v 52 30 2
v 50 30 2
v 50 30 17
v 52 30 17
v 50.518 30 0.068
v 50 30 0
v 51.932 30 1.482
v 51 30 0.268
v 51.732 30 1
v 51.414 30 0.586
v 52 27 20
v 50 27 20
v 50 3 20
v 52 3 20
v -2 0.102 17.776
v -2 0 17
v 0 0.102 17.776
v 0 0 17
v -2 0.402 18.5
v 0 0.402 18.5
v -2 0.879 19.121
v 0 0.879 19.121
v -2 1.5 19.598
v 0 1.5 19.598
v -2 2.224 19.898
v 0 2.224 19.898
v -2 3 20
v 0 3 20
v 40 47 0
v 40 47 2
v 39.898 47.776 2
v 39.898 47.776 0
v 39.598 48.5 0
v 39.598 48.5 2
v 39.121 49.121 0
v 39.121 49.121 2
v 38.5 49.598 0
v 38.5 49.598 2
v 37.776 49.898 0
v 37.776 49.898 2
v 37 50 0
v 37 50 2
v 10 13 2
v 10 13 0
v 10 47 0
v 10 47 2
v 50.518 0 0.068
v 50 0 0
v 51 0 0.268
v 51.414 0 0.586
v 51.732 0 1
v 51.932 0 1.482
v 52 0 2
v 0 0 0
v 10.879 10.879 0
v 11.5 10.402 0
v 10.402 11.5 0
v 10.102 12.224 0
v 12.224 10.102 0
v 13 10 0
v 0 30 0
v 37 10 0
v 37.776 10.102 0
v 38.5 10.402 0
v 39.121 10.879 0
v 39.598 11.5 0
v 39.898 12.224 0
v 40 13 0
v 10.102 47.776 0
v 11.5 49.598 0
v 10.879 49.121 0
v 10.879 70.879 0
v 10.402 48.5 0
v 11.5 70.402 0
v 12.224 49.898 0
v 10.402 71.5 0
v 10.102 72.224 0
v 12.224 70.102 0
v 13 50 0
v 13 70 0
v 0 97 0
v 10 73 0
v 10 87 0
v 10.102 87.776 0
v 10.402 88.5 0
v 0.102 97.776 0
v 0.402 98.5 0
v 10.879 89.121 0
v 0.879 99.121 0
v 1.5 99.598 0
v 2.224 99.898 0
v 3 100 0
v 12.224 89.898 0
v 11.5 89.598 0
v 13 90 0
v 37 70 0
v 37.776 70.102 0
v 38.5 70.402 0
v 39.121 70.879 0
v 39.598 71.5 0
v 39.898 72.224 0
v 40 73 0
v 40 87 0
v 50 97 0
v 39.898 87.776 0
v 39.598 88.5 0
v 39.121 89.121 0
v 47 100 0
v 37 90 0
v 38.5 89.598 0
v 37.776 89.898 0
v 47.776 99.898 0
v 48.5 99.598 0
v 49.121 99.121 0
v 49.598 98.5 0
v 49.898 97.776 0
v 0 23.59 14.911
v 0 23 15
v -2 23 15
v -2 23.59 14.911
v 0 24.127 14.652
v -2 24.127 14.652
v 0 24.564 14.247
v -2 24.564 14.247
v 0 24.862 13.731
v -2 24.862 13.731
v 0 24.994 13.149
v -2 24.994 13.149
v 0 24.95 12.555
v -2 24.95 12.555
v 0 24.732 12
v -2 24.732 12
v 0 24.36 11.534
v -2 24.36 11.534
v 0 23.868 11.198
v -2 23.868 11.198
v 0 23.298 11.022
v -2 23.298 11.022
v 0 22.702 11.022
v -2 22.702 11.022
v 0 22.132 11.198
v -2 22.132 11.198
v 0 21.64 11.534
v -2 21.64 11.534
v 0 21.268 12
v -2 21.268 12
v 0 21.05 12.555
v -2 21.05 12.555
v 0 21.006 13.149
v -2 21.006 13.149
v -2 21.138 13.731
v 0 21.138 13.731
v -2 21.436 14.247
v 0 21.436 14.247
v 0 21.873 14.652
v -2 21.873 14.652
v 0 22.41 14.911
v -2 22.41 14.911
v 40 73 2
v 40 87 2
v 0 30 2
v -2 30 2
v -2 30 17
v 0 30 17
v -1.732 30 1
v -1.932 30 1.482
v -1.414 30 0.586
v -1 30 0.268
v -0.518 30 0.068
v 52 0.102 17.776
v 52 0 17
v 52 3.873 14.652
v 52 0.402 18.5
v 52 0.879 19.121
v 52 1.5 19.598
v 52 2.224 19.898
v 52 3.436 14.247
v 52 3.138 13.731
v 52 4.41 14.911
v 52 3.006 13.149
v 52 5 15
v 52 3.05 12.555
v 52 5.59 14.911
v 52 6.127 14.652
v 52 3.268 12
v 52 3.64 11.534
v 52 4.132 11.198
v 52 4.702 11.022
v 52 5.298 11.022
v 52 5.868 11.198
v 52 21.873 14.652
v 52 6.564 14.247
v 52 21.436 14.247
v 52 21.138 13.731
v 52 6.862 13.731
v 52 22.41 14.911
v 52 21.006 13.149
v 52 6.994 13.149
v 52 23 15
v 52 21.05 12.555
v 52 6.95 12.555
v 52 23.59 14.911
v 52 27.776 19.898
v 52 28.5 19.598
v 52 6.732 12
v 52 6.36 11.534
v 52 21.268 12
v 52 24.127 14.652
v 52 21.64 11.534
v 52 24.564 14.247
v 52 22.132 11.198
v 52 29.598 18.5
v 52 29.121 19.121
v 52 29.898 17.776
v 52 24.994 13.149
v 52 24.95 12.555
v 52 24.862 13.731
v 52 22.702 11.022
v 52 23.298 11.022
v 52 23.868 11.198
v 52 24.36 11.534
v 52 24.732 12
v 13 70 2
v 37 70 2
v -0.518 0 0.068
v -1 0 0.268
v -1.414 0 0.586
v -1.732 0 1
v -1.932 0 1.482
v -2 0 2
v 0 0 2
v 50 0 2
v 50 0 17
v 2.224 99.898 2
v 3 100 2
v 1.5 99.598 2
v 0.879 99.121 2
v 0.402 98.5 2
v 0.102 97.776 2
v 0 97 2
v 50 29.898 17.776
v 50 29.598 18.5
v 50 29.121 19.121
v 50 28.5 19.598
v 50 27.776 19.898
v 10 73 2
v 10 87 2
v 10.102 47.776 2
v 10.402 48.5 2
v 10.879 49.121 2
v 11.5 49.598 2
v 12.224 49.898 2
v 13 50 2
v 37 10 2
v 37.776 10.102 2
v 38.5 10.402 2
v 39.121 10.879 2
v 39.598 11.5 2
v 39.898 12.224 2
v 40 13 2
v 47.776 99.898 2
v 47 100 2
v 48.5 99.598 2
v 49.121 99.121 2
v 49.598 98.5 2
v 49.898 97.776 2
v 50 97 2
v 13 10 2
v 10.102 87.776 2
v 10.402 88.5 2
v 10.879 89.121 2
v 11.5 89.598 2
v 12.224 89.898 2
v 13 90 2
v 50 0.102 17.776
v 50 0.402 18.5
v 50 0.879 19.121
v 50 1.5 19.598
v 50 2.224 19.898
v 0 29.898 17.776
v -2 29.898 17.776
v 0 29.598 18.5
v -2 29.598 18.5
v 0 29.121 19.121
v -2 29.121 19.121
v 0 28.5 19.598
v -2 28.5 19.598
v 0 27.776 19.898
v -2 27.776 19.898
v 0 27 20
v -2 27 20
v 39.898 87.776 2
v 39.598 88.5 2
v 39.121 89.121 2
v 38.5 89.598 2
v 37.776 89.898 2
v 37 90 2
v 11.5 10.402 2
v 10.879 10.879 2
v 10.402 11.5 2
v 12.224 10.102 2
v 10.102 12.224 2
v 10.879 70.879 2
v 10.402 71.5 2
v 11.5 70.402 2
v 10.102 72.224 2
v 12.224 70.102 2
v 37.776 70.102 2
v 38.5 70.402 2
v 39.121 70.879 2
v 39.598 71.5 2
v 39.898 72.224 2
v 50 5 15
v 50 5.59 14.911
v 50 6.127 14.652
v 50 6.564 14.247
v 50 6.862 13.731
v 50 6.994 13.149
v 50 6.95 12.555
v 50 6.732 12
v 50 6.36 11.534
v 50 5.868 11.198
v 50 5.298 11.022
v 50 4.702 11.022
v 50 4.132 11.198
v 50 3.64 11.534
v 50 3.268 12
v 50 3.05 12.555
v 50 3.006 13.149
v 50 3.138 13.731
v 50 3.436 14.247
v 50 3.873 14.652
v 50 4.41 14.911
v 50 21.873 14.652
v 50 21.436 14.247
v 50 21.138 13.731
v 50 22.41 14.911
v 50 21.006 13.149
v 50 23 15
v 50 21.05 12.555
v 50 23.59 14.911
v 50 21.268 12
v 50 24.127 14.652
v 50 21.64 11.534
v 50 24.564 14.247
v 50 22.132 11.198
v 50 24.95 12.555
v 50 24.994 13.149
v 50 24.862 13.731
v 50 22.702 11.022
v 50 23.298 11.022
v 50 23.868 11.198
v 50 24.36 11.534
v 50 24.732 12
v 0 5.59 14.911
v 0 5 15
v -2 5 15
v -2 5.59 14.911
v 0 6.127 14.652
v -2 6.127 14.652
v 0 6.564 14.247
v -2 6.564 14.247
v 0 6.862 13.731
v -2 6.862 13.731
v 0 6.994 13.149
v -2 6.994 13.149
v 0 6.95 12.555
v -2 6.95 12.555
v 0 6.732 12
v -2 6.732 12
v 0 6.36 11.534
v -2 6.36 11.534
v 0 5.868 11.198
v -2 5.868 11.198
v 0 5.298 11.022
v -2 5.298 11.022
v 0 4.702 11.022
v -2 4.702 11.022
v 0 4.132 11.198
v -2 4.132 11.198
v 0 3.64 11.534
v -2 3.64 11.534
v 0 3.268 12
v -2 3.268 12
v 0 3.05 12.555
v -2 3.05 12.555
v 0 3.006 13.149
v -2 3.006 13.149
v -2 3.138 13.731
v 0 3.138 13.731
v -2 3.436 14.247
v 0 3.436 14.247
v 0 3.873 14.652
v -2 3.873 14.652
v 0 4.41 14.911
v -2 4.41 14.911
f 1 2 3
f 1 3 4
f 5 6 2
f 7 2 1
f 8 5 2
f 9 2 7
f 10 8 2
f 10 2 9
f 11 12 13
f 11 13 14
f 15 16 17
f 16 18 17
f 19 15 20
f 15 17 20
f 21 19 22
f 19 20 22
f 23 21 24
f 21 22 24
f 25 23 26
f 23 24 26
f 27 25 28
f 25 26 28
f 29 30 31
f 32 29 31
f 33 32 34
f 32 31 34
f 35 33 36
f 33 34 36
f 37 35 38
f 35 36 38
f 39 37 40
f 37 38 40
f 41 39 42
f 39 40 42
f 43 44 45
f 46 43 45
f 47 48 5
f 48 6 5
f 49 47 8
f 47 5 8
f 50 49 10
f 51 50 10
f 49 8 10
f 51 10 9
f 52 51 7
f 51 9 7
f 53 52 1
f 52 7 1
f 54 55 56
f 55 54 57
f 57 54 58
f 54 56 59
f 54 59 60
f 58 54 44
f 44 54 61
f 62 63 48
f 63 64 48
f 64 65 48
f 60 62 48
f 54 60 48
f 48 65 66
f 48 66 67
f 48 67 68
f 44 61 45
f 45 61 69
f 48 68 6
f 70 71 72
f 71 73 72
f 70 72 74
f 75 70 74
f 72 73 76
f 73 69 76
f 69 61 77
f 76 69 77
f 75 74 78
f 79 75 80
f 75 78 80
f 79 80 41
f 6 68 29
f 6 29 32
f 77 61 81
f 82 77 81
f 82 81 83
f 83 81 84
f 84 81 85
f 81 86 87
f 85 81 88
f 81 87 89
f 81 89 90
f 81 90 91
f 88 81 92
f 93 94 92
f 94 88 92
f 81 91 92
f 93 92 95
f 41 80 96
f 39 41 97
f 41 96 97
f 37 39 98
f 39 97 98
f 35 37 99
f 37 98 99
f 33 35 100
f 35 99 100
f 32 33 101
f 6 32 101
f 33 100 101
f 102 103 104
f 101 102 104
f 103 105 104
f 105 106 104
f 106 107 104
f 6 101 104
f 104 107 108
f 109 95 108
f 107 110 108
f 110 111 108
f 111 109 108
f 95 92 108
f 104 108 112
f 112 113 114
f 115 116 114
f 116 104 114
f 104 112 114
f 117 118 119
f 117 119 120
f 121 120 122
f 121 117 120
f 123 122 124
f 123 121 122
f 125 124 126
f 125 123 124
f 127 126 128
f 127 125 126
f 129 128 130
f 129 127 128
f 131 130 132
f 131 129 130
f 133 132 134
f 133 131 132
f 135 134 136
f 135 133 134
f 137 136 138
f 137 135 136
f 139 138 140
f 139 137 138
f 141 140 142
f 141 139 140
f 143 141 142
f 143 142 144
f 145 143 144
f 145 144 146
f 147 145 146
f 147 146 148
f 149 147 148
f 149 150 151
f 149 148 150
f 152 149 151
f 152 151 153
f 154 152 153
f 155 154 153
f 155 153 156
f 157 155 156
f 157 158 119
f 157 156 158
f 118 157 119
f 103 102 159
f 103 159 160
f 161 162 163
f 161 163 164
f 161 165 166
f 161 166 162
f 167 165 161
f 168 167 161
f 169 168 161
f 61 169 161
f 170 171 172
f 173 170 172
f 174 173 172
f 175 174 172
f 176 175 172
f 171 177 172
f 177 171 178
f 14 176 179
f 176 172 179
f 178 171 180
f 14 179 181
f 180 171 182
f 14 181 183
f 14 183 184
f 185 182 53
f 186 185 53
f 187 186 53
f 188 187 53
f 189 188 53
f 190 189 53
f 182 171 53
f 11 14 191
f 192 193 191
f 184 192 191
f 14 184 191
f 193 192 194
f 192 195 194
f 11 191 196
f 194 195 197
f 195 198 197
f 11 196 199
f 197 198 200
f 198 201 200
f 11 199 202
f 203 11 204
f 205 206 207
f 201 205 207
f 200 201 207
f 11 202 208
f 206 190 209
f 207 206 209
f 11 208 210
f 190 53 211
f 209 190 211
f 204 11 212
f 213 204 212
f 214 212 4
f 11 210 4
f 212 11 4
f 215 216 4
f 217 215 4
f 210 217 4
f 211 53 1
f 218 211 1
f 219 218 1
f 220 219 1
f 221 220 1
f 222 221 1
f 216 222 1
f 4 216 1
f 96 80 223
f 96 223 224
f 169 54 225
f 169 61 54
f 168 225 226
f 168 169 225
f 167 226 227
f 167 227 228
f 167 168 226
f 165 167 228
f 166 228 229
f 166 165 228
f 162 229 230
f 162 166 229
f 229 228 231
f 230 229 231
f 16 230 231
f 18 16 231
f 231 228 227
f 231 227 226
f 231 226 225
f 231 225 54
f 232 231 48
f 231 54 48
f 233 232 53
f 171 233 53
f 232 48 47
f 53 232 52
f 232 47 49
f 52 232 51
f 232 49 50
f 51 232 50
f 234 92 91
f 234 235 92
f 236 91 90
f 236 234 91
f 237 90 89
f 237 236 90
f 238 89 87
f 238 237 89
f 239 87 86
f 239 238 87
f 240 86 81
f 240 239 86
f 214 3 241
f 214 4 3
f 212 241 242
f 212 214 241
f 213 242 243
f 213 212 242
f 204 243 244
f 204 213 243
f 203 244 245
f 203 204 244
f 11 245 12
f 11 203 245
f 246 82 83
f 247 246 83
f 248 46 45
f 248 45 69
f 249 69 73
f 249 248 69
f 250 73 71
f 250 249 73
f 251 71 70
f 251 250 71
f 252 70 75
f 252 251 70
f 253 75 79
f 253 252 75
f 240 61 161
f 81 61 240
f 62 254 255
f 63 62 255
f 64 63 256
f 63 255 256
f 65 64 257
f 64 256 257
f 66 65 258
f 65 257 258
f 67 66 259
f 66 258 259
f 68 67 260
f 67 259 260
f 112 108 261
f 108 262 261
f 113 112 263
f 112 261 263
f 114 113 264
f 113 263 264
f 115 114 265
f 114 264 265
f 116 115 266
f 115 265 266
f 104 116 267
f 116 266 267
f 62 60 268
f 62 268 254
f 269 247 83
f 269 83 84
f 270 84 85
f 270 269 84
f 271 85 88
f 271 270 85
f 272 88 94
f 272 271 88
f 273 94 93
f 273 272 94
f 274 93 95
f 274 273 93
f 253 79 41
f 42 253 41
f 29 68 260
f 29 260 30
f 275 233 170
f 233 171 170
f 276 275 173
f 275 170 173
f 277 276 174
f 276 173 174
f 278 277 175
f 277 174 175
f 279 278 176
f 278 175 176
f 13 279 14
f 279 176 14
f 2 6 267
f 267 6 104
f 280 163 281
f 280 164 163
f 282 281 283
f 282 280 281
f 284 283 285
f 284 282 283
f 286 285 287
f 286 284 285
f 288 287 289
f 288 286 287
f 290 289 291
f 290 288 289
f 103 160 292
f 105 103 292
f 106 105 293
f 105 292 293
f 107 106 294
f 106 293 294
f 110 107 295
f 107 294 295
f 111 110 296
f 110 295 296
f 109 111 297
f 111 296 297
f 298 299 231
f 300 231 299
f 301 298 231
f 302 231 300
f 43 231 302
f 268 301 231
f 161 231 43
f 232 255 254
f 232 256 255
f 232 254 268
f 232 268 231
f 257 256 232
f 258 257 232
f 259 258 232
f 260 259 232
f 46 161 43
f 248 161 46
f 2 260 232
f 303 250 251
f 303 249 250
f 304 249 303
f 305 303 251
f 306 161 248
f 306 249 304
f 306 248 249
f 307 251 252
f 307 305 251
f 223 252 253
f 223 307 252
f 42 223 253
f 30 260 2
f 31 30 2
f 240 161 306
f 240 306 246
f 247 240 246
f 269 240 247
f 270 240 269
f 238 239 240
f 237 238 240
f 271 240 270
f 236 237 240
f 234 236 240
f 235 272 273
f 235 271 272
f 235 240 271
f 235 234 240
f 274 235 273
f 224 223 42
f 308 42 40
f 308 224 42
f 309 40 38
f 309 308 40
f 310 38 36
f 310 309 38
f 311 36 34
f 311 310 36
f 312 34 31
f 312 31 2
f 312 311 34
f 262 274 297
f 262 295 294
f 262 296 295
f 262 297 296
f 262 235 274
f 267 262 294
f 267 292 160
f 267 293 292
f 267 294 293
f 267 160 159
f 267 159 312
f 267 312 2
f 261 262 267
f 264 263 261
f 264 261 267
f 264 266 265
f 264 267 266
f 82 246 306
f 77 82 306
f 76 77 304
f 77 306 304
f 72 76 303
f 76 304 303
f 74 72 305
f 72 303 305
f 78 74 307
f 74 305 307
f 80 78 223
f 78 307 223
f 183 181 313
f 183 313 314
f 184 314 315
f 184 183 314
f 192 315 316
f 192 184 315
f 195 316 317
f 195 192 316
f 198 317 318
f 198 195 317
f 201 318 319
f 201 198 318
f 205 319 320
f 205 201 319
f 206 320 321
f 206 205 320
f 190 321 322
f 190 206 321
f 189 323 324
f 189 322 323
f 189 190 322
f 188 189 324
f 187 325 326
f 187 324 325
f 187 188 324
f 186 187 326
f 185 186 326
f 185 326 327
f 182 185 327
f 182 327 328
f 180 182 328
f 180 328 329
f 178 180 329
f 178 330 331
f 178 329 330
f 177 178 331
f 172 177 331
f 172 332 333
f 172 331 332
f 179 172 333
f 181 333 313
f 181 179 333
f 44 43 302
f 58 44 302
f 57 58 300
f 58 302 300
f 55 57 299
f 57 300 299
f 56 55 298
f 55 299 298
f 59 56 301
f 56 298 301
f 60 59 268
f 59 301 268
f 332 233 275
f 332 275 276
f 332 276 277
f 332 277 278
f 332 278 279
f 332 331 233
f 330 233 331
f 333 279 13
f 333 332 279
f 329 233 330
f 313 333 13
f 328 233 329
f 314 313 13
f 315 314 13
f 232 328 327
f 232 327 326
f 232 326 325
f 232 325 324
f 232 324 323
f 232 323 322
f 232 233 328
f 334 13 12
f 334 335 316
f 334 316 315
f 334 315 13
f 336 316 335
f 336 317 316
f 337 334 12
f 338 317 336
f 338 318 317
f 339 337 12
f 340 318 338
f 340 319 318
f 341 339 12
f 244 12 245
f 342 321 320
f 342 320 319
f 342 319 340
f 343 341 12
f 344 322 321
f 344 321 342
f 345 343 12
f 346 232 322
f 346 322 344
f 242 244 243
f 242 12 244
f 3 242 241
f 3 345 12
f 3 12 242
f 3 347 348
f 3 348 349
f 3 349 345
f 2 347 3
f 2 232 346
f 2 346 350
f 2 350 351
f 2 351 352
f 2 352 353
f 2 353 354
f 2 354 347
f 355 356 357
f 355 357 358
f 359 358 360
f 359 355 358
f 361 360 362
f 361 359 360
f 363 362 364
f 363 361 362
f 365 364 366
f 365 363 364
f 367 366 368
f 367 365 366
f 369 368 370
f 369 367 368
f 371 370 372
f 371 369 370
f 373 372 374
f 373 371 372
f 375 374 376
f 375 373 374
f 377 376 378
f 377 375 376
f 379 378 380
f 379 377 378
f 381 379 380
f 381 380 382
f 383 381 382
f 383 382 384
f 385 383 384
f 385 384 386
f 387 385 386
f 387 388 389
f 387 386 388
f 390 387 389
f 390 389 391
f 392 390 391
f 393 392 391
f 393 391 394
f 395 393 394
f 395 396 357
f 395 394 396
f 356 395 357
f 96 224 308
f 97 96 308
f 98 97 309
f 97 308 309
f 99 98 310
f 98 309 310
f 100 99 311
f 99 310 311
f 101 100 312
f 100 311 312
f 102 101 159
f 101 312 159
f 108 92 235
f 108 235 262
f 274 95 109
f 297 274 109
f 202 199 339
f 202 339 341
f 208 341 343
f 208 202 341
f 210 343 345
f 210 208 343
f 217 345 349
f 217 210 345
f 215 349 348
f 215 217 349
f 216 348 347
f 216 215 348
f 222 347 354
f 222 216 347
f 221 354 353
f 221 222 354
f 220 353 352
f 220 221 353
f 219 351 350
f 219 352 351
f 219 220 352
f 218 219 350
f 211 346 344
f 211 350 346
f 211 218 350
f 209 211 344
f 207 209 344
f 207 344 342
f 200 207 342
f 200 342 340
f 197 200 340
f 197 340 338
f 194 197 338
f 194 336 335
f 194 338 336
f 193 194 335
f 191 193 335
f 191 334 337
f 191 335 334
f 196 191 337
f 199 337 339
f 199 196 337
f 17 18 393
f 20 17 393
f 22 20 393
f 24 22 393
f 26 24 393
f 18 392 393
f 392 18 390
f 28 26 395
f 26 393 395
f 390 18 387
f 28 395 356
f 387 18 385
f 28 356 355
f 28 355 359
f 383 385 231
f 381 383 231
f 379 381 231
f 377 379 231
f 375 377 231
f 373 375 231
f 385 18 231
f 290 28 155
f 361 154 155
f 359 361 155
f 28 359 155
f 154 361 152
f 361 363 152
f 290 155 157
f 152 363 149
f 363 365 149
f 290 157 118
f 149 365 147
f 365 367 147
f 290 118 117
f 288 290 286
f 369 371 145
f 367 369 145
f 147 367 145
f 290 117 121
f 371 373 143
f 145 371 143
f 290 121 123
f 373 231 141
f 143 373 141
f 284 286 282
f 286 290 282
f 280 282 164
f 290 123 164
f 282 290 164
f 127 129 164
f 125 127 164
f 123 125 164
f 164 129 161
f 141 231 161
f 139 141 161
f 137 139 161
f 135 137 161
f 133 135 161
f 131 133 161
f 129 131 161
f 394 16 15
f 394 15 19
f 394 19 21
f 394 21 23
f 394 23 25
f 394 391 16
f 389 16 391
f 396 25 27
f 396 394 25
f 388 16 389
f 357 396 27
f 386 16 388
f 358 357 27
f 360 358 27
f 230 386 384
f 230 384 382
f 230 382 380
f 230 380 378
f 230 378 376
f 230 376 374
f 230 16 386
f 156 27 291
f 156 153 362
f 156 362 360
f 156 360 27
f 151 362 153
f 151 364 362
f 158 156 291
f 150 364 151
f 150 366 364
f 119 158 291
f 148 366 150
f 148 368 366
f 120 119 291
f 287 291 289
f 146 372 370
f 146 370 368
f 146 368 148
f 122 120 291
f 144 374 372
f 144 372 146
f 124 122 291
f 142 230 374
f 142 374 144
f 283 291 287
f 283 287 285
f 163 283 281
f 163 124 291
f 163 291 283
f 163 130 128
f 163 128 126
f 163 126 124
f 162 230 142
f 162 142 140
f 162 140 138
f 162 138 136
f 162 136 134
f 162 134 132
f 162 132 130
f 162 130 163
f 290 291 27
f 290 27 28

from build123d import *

# Parameters (mm, degrees)
CYLINDER001_R     = 2
CYLINDER001_DEPTH = 10
CYLINDER_R        = 2
CYLINDER_DEPTH    = 10
BOX003_W          = 2
BOX003_H          = 30
BOX003_DEPTH      = 20
FILLET004_R       = 3
CYLINDER003_R     = 2
CYLINDER003_DEPTH = 10
CYLINDER002_R     = 2
CYLINDER002_DEPTH = 10
BOX004_W          = 2
BOX004_H          = 30
BOX004_DEPTH      = 20
FILLET005_R       = 3
BOX002_W          = 30
BOX002_H          = 40
BOX002_DEPTH      = 10
FILLET001_R       = 3
BOX001_W          = 30
BOX001_H          = 20
BOX001_DEPTH      = 10
FILLET_R          = 3
BOX_W             = 50
BOX_H             = 100
BOX_DEPTH         = 2
FILLET002_R       = 3
FILLET003_R       = 3
FILLET006_R       = 2
FILLET007_R       = 2


with BuildPart() as cilindre001:
    # Cylinder001 → Cylinder001 (new body)
    with BuildSketch(Plane(origin=(-10, 23, 13), x_dir=(0, 0, 1), z_dir=(-1, 0, 0))):
        Circle(CYLINDER001_R)
    extrude(amount=CYLINDER001_DEPTH)


with BuildPart() as cilindre:
    # Cylinder → Cylinder (new body)
    with BuildSketch(Plane(origin=(-10, 5, 13), x_dir=(0, 0, 1), z_dir=(-1, 0, 0))):
        Circle(CYLINDER_R)
    extrude(amount=CYLINDER_DEPTH)


with BuildPart() as cut003:
    # Box003 → Box003 (new body)
    with BuildSketch(Plane(origin=(-14, 0, 0), x_dir=(1, 0, 0), z_dir=(0, 0, 1))):
        with Locations((1, 15)):
            Rectangle(BOX003_W, BOX003_H)
    extrude(amount=BOX003_DEPTH)

    # Fillet004
    fillet004_edges = [cut003.edges().sort_by_distance(p)[0] for p in [
        (-13, 0, 20),
        (-13, 30, 20),
    ]]
    fillet(fillet004_edges, radius=FILLET004_R)

    # Cut002: cut Cilindre
    add(cilindre.part, mode=Mode.SUBTRACT)

    # Cut003: cut Cilindre001
    add(cilindre001.part, mode=Mode.SUBTRACT)


with BuildPart() as cut003_1:
    # Cut003 placement: moved
    add(cut003.part.moved(Location((12, 0, 0))))


with BuildPart() as cilindre003:
    # Cylinder003 → Cylinder003 (new body)
    with BuildSketch(Plane(origin=(-10, 23, 13), x_dir=(0, 0, 1), z_dir=(-1, 0, 0))):
        Circle(CYLINDER003_R)
    extrude(amount=CYLINDER003_DEPTH)


with BuildPart() as cilindre002:
    # Cylinder002 → Cylinder002 (new body)
    with BuildSketch(Plane(origin=(-10, 5, 13), x_dir=(0, 0, 1), z_dir=(-1, 0, 0))):
        Circle(CYLINDER002_R)
    extrude(amount=CYLINDER002_DEPTH)


with BuildPart() as cut005:
    # Box004 → Box004 (new body)
    with BuildSketch(Plane(origin=(-14, 0, 0), x_dir=(1, 0, 0), z_dir=(0, 0, 1))):
        with Locations((1, 15)):
            Rectangle(BOX004_W, BOX004_H)
    extrude(amount=BOX004_DEPTH)

    # Fillet005
    fillet005_edges = [cut005.edges().sort_by_distance(p)[0] for p in [
        (-13, 0, 20),
        (-13, 30, 20),
    ]]
    fillet(fillet005_edges, radius=FILLET005_R)

    # Cut004: cut Cilindre002
    add(cilindre002.part, mode=Mode.SUBTRACT)

    # Cut005: cut Cilindre003
    add(cilindre003.part, mode=Mode.SUBTRACT)


with BuildPart() as cut005_1:
    # Cut005 placement: moved
    add(cut005.part.moved(Location((64, 0, 0))))


with BuildPart() as fillet001:
    # Box002 → Box002 (new body)
    with BuildSketch(Plane(origin=(10, 10, -2), x_dir=(1, 0, 0), z_dir=(0, 0, 1))):
        with Locations((15, 20)):
            Rectangle(BOX002_W, BOX002_H)
    extrude(amount=BOX002_DEPTH)

    # Fillet001
    fillet001_edges = [fillet001.edges().sort_by_distance(p)[0] for p in [
        (10, 10, 3),
        (10, 50, 3),
        (40, 10, 3),
        (40, 50, 3),
    ]]
    fillet(fillet001_edges, radius=FILLET001_R)


with BuildPart() as fillet_body:
    # Box001 → Box001 (new body)
    with BuildSketch(Plane(origin=(10, 70, 0), x_dir=(1, 0, 0), z_dir=(0, 0, 1))):
        with Locations((15, 10)):
            Rectangle(BOX001_W, BOX001_H)
    extrude(amount=BOX001_DEPTH)

    # Fillet
    fillet_edges = [fillet_body.edges().sort_by_distance(p)[0] for p in [
        (10, 70, 5),
        (10, 90, 5),
        (40, 70, 5),
        (40, 90, 5),
    ]]
    fillet(fillet_edges, radius=FILLET_R)


with BuildPart() as fillet_body_1:
    # Fillet placement: moved
    add(fillet_body.part.moved(Location((0, 0, -5))))


with BuildPart() as fillet007:
    # Box → Box (new body)
    with BuildSketch(Plane.XY):
        with Locations((25, 50)):
            Rectangle(BOX_W, BOX_H)
    extrude(amount=BOX_DEPTH)

    # Cut: cut Fillet body
    add(fillet_body_1.part, mode=Mode.SUBTRACT)

    # Cut001: cut Fillet001
    add(fillet001.part, mode=Mode.SUBTRACT)

    # Fillet002
    fillet002_edges = [fillet007.edges().sort_by_distance(p)[0] for p in [
        (50, 100, 1),
    ]]
    fillet(fillet002_edges, radius=FILLET002_R)

    # Fillet003
    fillet003_edges = [fillet007.edges().sort_by_distance(p)[0] for p in [
        (0, 100, 1),
    ]]
    fillet(fillet003_edges, radius=FILLET003_R)

    # Fusion: union Cut003, Cut005
    add(cut003_1.part)
    add(cut005_1.part)

    # Fillet006
    fillet006_edges = [fillet007.edges().sort_by_distance(p)[0] for p in [
        (-2, 15, 0),
    ]]
    fillet(fillet006_edges, radius=FILLET006_R)

    # Fillet007
    fillet007_edges = [fillet007.edges().sort_by_distance(p)[0] for p in [
        (52, 15, 0),
    ]]
    fillet(fillet007_edges, radius=FILLET007_R)


solid = fillet007.part
